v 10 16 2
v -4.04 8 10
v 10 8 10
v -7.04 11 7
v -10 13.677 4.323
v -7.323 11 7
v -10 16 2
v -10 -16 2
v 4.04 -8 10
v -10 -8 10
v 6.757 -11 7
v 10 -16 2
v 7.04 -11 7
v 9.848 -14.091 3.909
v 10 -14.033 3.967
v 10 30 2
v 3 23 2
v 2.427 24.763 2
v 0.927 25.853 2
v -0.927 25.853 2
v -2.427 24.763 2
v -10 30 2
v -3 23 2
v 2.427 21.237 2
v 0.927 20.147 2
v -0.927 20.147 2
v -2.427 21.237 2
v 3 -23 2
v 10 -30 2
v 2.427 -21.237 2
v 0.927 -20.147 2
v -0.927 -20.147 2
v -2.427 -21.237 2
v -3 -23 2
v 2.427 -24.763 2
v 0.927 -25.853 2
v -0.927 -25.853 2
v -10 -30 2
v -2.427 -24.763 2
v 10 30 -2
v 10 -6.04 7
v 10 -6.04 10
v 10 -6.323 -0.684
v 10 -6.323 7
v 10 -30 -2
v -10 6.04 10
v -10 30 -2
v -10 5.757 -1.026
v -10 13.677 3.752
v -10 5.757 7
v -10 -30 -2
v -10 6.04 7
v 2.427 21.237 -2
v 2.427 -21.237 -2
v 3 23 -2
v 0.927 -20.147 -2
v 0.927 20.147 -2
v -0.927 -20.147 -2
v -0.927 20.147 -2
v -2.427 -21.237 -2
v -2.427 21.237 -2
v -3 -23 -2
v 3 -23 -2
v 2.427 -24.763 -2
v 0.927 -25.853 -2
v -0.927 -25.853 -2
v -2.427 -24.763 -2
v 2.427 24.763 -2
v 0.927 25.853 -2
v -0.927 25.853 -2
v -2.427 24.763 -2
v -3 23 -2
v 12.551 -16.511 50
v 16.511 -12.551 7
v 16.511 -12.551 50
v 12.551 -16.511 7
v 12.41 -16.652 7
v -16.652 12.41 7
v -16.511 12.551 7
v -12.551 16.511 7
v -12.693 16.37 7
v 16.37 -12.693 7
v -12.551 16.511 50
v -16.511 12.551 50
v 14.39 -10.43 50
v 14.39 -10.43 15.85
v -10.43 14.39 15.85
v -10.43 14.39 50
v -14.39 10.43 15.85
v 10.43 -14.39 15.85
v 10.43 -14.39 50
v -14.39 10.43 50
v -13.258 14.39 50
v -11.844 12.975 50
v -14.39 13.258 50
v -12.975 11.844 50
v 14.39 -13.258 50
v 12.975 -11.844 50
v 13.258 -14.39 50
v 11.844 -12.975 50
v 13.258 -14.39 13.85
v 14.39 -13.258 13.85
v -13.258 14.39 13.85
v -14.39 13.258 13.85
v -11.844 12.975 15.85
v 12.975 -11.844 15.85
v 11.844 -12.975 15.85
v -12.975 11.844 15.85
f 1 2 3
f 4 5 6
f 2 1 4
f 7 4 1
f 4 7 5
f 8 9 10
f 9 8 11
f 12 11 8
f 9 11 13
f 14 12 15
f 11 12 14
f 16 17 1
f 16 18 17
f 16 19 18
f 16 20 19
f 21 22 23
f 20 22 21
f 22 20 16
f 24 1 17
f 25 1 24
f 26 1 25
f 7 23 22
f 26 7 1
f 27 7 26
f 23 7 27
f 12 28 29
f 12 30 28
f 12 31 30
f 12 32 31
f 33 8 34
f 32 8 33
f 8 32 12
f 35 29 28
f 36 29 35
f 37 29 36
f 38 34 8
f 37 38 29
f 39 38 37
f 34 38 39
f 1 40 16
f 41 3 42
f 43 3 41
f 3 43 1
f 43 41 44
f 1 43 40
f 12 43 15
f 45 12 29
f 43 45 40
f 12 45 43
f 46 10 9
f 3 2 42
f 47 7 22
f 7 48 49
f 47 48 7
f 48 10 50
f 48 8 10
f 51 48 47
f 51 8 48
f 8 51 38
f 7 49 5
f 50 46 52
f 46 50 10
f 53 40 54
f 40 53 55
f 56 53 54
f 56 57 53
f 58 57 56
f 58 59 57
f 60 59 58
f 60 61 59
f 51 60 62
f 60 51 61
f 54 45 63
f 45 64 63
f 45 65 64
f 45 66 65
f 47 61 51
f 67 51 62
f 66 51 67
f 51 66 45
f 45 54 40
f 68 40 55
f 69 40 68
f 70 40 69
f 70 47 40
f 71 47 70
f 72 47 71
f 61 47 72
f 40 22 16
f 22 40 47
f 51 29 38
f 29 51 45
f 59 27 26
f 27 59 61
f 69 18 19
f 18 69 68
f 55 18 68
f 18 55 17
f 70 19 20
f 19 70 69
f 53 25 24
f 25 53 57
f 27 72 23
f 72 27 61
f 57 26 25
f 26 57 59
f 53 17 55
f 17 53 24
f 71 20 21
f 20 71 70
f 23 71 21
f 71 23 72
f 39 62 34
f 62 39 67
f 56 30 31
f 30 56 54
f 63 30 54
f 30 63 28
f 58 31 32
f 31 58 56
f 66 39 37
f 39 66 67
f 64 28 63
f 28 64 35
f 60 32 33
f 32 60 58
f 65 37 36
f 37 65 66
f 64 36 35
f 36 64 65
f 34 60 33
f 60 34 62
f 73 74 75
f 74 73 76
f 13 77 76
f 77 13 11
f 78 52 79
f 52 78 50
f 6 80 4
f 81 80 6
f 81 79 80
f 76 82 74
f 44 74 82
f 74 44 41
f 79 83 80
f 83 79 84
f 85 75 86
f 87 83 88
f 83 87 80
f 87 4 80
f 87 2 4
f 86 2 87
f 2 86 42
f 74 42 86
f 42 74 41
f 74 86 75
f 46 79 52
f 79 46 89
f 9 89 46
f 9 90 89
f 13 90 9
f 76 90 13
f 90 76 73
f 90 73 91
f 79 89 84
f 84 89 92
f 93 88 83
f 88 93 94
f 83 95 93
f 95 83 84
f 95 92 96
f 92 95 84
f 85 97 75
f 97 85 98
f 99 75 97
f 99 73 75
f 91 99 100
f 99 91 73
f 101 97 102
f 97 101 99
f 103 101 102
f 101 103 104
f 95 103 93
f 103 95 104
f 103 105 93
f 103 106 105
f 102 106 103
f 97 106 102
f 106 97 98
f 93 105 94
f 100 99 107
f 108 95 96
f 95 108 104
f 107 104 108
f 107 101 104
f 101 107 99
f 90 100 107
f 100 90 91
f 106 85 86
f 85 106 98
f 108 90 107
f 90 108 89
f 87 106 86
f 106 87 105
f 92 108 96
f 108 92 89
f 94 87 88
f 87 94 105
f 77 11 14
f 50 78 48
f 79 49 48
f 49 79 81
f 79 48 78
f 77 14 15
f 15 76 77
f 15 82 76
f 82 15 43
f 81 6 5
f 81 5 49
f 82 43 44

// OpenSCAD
module trapezoid_3d(bottom_length, top_length, height, depth) {
    points = [
        [-(bottom_length / 2), 0], // Bottom left
        [ (bottom_length / 2), 0], // Bottom right
        [ (top_length / 2), height], // Top right
        [-(top_length / 2), height] // Top left
    ];
    
    faces = [
        [0, 1, 2, 3] // Face for the trapezoid
    ];
    
    rotate([90, 0, 90]) {
        linear_extrude(height = depth) polygon(points=points, paths=faces);
    }
}

module raw_base() {
    union() {
        translate([-10, 0, 2])
        trapezoid_3d(32, 16, 8, 20);
        cube([20, 60, 4], center = true); 
    }
}

module base() {
    difference() {
        raw_base();
        translate([0, (30-2-5), 0])
        cylinder(r = 3, h = 20, center = true);
        translate([0,-(30-2-5), 0])
        cylinder(r = 3, h = 20, center = true);
    }
}



module lens(size, depth) {
    translate([0, 0, 8+50.8/2])
    rotate([0, 0, -45])
    cube([size, depth, size], center=true);
}

module lens_frame(size, depth) {
    difference() {
        translate([0, 0, 8+50.8/2])
        rotate([0, 0, -45])
        cube([size+2, depth+4, 50.8+2], center=true);
        
        translate([0,0,70])
        rotate([0, 0, -45])
        cube([100, 20, 40], center=true);
    }
}

module lens_clearance(size, depth) {
    translate([0, 0, 8+25.4])
    rotate([0, 0, -45])
    cube([size-4, depth+5, size-4], center=true);
}

size = 39.1;
depth = 1.6;

difference() {
    union() {
        base();
        lens_frame(size, depth);
    }
    lens(size, depth);
    lens_clearance(size, depth);
}


rotate([0, 0, 45])
translate([-3, 0, -2])
trapezoid_3d(20, size+2, 9, depth+4);
